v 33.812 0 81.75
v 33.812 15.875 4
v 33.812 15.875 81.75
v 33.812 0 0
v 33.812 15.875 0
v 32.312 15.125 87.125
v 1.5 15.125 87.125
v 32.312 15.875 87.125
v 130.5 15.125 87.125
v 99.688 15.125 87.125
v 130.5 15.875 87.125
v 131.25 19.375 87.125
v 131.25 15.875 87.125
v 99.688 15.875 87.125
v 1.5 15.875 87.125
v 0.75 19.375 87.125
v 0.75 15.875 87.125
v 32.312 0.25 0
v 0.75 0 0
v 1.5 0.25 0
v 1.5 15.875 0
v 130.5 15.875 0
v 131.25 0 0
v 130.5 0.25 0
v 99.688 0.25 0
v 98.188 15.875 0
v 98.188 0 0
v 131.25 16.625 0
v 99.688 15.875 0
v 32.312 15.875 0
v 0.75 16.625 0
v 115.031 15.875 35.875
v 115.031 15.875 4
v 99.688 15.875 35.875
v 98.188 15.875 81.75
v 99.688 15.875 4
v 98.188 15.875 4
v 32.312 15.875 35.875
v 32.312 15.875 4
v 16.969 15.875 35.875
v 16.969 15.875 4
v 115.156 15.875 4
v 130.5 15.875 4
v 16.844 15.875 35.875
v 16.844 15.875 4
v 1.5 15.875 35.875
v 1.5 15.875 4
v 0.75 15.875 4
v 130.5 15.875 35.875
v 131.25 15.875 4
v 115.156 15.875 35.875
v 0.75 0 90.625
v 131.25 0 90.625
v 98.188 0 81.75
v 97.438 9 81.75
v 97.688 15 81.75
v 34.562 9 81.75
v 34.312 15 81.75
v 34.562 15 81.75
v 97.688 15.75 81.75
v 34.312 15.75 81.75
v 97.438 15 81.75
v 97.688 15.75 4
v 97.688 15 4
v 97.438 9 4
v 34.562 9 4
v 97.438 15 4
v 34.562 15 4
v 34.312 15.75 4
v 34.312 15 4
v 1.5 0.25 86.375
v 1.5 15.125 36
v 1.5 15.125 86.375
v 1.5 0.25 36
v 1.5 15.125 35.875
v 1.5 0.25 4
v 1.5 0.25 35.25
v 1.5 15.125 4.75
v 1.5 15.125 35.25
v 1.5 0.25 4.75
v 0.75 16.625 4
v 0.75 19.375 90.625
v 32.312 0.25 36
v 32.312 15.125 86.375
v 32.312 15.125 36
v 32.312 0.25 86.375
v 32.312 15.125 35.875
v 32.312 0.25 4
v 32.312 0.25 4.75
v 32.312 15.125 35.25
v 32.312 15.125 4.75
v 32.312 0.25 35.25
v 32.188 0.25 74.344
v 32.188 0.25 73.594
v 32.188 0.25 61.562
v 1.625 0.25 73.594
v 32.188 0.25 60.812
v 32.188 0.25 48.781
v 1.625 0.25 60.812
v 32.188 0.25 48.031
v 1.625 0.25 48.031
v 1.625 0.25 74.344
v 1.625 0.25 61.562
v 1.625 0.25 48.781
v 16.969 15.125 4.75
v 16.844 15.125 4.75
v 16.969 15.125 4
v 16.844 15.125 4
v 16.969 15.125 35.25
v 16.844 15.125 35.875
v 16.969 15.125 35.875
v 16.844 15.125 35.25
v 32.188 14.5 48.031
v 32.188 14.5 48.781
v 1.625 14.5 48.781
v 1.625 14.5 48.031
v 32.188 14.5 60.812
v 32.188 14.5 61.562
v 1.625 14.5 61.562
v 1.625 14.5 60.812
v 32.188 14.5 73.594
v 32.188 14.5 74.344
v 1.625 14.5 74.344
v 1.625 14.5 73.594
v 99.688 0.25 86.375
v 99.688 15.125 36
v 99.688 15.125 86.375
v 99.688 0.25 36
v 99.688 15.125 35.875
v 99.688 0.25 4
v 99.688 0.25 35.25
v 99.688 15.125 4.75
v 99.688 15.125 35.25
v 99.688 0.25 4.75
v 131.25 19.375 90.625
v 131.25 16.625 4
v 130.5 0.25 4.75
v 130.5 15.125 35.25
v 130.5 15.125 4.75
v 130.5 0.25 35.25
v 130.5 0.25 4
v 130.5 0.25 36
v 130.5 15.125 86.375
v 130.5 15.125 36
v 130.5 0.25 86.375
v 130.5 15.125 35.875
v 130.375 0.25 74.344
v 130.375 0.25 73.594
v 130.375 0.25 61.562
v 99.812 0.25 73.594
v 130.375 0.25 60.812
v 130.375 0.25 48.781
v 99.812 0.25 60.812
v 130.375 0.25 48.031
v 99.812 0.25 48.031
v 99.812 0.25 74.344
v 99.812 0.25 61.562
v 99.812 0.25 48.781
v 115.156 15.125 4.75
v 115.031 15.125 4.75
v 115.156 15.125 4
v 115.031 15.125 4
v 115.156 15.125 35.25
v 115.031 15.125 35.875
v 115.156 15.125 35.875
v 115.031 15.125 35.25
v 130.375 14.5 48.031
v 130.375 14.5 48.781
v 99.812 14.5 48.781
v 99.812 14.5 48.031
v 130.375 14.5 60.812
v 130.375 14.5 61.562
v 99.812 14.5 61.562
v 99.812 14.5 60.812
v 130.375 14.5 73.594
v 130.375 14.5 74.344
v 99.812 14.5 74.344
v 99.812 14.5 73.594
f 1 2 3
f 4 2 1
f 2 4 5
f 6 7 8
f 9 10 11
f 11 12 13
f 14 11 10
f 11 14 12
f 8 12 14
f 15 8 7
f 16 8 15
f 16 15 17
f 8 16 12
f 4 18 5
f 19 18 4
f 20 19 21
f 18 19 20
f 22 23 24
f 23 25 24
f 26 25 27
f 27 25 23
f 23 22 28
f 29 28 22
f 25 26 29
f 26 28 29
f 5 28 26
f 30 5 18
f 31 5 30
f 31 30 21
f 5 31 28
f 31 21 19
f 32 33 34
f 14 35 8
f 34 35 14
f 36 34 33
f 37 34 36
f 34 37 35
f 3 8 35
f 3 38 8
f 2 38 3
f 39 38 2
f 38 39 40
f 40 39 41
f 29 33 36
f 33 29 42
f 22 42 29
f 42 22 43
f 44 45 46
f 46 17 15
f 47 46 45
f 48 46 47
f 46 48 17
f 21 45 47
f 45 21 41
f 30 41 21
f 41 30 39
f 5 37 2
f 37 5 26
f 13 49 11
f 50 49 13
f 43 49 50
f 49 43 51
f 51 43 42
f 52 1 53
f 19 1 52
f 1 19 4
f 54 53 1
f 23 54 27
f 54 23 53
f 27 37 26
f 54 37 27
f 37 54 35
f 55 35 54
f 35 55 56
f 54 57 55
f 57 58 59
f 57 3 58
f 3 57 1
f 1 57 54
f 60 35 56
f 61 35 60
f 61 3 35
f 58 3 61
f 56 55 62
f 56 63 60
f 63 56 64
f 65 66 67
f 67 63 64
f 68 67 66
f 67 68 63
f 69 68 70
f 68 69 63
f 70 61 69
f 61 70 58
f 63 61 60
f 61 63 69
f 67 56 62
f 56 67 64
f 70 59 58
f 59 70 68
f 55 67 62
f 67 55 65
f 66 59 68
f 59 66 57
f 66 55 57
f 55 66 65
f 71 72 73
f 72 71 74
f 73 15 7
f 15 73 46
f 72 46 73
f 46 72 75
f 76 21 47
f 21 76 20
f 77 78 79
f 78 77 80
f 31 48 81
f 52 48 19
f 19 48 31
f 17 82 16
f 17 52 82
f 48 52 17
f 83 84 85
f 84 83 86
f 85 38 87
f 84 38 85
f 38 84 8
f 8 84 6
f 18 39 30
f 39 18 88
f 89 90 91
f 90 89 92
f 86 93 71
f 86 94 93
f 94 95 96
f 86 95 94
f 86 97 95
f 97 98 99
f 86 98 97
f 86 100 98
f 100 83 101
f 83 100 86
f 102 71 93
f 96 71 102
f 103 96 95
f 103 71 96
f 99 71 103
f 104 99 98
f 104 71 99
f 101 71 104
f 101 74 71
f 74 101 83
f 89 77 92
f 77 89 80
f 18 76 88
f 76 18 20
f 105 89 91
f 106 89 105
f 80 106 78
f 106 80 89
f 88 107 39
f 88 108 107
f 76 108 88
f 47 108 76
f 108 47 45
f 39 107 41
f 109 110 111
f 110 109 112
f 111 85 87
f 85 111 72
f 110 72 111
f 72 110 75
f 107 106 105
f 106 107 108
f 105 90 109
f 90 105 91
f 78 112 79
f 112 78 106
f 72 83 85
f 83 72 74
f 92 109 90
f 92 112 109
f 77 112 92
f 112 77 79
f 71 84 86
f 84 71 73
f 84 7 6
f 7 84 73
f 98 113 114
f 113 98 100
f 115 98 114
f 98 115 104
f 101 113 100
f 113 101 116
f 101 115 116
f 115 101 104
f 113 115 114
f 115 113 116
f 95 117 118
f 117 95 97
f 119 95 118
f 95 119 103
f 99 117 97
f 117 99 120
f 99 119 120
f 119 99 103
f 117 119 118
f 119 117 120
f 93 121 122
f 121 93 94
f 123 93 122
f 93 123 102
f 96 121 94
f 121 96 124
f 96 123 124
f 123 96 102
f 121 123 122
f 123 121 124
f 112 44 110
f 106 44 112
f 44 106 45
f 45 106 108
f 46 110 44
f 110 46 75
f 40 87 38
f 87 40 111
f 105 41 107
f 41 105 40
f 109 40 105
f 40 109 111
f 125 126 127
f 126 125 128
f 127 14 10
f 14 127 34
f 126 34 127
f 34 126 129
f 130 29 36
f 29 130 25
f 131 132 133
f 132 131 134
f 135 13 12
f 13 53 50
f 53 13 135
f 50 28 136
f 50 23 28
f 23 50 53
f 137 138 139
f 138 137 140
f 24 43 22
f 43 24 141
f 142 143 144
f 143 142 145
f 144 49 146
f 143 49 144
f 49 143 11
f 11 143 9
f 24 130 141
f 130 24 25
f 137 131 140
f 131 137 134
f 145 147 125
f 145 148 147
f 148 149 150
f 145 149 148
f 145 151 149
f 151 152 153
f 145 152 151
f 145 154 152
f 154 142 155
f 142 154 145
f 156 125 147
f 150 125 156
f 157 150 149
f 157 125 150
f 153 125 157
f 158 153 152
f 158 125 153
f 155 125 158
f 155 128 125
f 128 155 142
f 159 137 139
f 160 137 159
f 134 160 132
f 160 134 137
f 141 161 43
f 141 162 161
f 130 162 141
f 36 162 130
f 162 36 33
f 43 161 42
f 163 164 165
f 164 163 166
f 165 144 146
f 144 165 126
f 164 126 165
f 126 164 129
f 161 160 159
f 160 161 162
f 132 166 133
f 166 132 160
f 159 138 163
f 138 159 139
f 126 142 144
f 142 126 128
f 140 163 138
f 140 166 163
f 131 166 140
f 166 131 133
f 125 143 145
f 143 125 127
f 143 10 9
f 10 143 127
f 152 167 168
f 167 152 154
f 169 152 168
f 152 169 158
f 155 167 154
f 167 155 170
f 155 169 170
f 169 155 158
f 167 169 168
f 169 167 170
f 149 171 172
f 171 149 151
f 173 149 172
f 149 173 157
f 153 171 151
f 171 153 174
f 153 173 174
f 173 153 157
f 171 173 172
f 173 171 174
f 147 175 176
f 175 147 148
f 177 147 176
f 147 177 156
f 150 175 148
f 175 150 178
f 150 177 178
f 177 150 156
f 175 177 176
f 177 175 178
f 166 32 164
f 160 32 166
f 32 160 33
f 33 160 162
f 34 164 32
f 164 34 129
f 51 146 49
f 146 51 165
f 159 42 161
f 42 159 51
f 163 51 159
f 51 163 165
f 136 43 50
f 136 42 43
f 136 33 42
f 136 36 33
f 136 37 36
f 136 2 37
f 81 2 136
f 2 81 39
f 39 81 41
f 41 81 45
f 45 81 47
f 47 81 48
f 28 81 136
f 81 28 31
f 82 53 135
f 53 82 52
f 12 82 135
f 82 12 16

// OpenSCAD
// Generated by design.py - open in OpenSCAD (free).  Units: inches.
union() {
  // bed vertical L
  translate([33.0625,0.0000,0.0000]) cube([0.7500,15.8750,87.1250]);
  // bed vertical R
  translate([98.1875,0.0000,0.0000]) cube([0.7500,15.8750,87.1250]);
  // bed header
  translate([33.8125,0.0000,81.7500]) cube([64.3750,15.8750,5.3750]);
  // bed face (closed)
  translate([34.3125,15.0000,4.0000]) cube([63.3750,0.7500,81.7500]);
  // bed frame (closed)
  translate([34.5625,9.0000,4.0000]) cube([62.8750,6.0000,81.0000]);
  // tower side out L
  translate([0.7500,0.0000,0.0000]) cube([0.7500,15.8750,87.1250]);
  // tower side in L
  translate([32.3125,0.0000,0.0000]) cube([0.7500,15.8750,87.1250]);
  // tower back L
  translate([0.7500,0.0000,0.0000]) cube([32.3125,0.2500,87.1250]);
  // tower fixed L z4.0
  translate([1.5000,0.2500,4.0000]) cube([30.8125,14.8750,0.7500]);
  // tower fixed L z35.25
  translate([1.5000,0.2500,35.2500]) cube([30.8125,14.8750,0.7500]);
  // tower fixed L z86.375
  translate([1.5000,0.2500,86.3750]) cube([30.8125,14.8750,0.7500]);
  // tower shelf L 1
  translate([1.6250,0.2500,48.0312]) cube([30.5625,14.2500,0.7500]);
  // tower shelf L 2
  translate([1.6250,0.2500,60.8125]) cube([30.5625,14.2500,0.7500]);
  // tower shelf L 3
  translate([1.6250,0.2500,73.5938]) cube([30.5625,14.2500,0.7500]);
  // door L0
  translate([0.8125,15.1250,4.0000]) cube([16.0312,0.7500,31.8750]);
  // door L1
  translate([16.9688,15.1250,4.0000]) cube([16.0312,0.7500,31.8750]);
  // tower side out R
  translate([98.9375,0.0000,0.0000]) cube([0.7500,15.8750,87.1250]);
  // tower side in R
  translate([130.5000,0.0000,0.0000]) cube([0.7500,15.8750,87.1250]);
  // tower back R
  translate([98.9375,0.0000,0.0000]) cube([32.3125,0.2500,87.1250]);
  // tower fixed R z4.0
  translate([99.6875,0.2500,4.0000]) cube([30.8125,14.8750,0.7500]);
  // tower fixed R z35.25
  translate([99.6875,0.2500,35.2500]) cube([30.8125,14.8750,0.7500]);
  // tower fixed R z86.375
  translate([99.6875,0.2500,86.3750]) cube([30.8125,14.8750,0.7500]);
  // tower shelf R 1
  translate([99.8125,0.2500,48.0312]) cube([30.5625,14.2500,0.7500]);
  // tower shelf R 2
  translate([99.8125,0.2500,60.8125]) cube([30.5625,14.2500,0.7500]);
  // tower shelf R 3
  translate([99.8125,0.2500,73.5938]) cube([30.5625,14.2500,0.7500]);
  // door R0
  translate([99.0000,15.1250,4.0000]) cube([16.0312,0.7500,31.8750]);
  // door R1
  translate([115.1562,15.1250,4.0000]) cube([16.0312,0.7500,31.8750]);
  // base molding
  translate([0.7500,15.8750,0.0000]) cube([130.5000,0.7500,4.0000]);
  // crown
  translate([0.7500,0.0000,87.1250]) cube([130.5000,19.3750,3.5000]);
}
// Room reference (wall, ceiling): comment out if unwanted
%translate([0,-1,0]) cube([132.0,1,96.0]);
